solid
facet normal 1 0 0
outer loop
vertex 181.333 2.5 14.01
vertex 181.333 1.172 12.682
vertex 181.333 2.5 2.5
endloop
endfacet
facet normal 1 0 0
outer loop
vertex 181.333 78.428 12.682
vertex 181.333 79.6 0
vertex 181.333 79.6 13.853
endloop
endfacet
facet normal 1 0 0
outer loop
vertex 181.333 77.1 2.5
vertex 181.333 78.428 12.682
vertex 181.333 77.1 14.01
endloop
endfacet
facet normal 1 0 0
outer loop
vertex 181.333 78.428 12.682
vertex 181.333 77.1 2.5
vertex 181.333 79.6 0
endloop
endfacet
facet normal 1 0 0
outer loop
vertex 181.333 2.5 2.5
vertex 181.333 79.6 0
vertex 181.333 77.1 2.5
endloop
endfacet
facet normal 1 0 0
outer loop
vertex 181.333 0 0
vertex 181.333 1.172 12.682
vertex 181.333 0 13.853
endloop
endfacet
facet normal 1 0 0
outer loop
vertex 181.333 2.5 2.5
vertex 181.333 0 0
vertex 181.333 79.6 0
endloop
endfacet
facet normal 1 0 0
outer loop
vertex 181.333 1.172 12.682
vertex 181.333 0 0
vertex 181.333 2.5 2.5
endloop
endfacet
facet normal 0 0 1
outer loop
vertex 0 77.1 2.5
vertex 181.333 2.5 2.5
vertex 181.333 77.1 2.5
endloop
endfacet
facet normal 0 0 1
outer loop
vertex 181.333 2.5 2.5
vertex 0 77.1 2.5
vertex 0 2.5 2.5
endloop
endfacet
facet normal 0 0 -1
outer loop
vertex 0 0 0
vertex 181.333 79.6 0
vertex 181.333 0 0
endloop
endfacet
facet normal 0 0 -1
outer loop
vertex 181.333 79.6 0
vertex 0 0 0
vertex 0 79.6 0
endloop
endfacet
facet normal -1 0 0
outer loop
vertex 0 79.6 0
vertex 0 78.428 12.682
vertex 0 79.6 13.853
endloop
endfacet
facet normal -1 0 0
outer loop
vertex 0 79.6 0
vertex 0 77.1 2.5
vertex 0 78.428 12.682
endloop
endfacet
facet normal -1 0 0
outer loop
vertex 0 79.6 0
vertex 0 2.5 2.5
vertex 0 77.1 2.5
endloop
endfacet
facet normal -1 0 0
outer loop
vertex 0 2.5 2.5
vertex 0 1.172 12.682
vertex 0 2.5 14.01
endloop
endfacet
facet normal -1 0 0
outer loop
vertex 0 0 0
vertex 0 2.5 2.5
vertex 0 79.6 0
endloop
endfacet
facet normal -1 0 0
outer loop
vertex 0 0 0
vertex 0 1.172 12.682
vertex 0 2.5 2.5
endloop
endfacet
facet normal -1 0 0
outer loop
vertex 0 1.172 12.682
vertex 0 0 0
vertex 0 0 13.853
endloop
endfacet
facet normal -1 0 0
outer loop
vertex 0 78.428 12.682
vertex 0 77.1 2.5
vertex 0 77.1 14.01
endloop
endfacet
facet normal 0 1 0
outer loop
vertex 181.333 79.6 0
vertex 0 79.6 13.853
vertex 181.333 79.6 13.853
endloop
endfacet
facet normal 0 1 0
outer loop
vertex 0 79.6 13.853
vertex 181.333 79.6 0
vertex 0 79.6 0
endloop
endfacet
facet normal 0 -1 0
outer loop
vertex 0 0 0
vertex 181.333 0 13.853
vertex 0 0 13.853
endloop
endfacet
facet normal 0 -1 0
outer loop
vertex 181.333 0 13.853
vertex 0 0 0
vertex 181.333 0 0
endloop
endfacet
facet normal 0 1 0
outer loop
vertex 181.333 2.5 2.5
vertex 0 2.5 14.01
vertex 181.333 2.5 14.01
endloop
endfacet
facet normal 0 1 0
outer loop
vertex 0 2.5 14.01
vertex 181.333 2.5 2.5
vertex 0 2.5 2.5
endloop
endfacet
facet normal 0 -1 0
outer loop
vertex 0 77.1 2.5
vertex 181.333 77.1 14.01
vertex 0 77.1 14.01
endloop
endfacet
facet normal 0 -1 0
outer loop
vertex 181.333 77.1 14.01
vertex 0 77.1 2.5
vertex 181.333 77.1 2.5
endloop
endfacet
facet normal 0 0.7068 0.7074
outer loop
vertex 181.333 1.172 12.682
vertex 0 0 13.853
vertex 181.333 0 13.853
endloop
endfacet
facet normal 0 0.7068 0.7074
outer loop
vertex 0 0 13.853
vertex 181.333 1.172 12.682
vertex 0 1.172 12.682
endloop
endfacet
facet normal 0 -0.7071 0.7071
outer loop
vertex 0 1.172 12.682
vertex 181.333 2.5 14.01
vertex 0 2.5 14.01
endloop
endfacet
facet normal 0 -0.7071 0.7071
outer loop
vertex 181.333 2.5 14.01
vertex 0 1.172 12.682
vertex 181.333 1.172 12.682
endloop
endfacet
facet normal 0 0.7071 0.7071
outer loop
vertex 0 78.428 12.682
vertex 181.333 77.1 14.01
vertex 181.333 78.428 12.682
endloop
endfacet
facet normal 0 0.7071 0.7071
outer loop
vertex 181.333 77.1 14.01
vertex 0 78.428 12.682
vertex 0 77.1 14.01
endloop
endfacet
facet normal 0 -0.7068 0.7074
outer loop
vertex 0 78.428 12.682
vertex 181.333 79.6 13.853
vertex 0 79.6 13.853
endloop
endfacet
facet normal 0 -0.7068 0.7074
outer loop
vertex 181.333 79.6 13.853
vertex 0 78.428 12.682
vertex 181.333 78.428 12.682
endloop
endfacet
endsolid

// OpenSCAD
// side_rail_001.scad
// Side rail / balance-lead raceway for the 20s5p pack.
//
// C-channel that snaps over the pack's -X side, covering the balance-wire
// run and stiffening the pack lengthwise. The walls grip the top/bottom
// pack faces with 0.4mm interference; the final pack wrap locks it down.
// No changes to already-printed parts required.
//
// The end-cap skirts cover 8mm at each pack end, so the free span is
// 560 - 2*8 = 544mm. Print 3 rails (~181.3mm each): laid end to end they
// bridge the holder section seams like brickwork, tying sections together.
// Optionally print 3 more for the +X side (no wires, pure stiffening).
//
// Walls ride on the pack faces 13mm in from the edge — clear of the rod
// nuts (28mm in) — and the strip channels are recessed, so the faces are
// flat where the walls land. The 7mm cavity swallows the full 21-wire
// balance bundle with room to spare.

$fn = 64;

rail_l   = 544/3;   // ~181.3 — three per side
pack_h   = 75;      // cell 71 + 2*2 floors
grip     = 0.4;     // total interference across the faces
web_t    = 2.5;
wall_t   = 2.5;
cavity   = 7;       // wire room between web and pack side
wall_len = cavity + 6;   // walls lap 6mm onto the pack faces
outer_h  = pack_h - grip + 2*wall_t;   // 79.6

// Printed web-down; the C opens upward.
difference() {
    union() {
        // web
        cube([rail_l, outer_h, web_t]);
        // walls
        cube([rail_l, wall_t, web_t + wall_len]);
        translate([0, outer_h - wall_t, 0])
            cube([rail_l, wall_t, web_t + wall_len]);
    }

    // lead-in chamfers on the wall tips (inside faces)
    translate([-1, wall_t + 1.5, web_t + wall_len + 0.01])
        rotate([135, 0, 0])
        cube([rail_l + 2, 4, 4]);
    translate([-1, outer_h - wall_t - 1.5, web_t + wall_len + 0.01])
        rotate([135, 0, 0])
        translate([0, -4, -4])
        cube([rail_l + 2, 4, 4]);
}
